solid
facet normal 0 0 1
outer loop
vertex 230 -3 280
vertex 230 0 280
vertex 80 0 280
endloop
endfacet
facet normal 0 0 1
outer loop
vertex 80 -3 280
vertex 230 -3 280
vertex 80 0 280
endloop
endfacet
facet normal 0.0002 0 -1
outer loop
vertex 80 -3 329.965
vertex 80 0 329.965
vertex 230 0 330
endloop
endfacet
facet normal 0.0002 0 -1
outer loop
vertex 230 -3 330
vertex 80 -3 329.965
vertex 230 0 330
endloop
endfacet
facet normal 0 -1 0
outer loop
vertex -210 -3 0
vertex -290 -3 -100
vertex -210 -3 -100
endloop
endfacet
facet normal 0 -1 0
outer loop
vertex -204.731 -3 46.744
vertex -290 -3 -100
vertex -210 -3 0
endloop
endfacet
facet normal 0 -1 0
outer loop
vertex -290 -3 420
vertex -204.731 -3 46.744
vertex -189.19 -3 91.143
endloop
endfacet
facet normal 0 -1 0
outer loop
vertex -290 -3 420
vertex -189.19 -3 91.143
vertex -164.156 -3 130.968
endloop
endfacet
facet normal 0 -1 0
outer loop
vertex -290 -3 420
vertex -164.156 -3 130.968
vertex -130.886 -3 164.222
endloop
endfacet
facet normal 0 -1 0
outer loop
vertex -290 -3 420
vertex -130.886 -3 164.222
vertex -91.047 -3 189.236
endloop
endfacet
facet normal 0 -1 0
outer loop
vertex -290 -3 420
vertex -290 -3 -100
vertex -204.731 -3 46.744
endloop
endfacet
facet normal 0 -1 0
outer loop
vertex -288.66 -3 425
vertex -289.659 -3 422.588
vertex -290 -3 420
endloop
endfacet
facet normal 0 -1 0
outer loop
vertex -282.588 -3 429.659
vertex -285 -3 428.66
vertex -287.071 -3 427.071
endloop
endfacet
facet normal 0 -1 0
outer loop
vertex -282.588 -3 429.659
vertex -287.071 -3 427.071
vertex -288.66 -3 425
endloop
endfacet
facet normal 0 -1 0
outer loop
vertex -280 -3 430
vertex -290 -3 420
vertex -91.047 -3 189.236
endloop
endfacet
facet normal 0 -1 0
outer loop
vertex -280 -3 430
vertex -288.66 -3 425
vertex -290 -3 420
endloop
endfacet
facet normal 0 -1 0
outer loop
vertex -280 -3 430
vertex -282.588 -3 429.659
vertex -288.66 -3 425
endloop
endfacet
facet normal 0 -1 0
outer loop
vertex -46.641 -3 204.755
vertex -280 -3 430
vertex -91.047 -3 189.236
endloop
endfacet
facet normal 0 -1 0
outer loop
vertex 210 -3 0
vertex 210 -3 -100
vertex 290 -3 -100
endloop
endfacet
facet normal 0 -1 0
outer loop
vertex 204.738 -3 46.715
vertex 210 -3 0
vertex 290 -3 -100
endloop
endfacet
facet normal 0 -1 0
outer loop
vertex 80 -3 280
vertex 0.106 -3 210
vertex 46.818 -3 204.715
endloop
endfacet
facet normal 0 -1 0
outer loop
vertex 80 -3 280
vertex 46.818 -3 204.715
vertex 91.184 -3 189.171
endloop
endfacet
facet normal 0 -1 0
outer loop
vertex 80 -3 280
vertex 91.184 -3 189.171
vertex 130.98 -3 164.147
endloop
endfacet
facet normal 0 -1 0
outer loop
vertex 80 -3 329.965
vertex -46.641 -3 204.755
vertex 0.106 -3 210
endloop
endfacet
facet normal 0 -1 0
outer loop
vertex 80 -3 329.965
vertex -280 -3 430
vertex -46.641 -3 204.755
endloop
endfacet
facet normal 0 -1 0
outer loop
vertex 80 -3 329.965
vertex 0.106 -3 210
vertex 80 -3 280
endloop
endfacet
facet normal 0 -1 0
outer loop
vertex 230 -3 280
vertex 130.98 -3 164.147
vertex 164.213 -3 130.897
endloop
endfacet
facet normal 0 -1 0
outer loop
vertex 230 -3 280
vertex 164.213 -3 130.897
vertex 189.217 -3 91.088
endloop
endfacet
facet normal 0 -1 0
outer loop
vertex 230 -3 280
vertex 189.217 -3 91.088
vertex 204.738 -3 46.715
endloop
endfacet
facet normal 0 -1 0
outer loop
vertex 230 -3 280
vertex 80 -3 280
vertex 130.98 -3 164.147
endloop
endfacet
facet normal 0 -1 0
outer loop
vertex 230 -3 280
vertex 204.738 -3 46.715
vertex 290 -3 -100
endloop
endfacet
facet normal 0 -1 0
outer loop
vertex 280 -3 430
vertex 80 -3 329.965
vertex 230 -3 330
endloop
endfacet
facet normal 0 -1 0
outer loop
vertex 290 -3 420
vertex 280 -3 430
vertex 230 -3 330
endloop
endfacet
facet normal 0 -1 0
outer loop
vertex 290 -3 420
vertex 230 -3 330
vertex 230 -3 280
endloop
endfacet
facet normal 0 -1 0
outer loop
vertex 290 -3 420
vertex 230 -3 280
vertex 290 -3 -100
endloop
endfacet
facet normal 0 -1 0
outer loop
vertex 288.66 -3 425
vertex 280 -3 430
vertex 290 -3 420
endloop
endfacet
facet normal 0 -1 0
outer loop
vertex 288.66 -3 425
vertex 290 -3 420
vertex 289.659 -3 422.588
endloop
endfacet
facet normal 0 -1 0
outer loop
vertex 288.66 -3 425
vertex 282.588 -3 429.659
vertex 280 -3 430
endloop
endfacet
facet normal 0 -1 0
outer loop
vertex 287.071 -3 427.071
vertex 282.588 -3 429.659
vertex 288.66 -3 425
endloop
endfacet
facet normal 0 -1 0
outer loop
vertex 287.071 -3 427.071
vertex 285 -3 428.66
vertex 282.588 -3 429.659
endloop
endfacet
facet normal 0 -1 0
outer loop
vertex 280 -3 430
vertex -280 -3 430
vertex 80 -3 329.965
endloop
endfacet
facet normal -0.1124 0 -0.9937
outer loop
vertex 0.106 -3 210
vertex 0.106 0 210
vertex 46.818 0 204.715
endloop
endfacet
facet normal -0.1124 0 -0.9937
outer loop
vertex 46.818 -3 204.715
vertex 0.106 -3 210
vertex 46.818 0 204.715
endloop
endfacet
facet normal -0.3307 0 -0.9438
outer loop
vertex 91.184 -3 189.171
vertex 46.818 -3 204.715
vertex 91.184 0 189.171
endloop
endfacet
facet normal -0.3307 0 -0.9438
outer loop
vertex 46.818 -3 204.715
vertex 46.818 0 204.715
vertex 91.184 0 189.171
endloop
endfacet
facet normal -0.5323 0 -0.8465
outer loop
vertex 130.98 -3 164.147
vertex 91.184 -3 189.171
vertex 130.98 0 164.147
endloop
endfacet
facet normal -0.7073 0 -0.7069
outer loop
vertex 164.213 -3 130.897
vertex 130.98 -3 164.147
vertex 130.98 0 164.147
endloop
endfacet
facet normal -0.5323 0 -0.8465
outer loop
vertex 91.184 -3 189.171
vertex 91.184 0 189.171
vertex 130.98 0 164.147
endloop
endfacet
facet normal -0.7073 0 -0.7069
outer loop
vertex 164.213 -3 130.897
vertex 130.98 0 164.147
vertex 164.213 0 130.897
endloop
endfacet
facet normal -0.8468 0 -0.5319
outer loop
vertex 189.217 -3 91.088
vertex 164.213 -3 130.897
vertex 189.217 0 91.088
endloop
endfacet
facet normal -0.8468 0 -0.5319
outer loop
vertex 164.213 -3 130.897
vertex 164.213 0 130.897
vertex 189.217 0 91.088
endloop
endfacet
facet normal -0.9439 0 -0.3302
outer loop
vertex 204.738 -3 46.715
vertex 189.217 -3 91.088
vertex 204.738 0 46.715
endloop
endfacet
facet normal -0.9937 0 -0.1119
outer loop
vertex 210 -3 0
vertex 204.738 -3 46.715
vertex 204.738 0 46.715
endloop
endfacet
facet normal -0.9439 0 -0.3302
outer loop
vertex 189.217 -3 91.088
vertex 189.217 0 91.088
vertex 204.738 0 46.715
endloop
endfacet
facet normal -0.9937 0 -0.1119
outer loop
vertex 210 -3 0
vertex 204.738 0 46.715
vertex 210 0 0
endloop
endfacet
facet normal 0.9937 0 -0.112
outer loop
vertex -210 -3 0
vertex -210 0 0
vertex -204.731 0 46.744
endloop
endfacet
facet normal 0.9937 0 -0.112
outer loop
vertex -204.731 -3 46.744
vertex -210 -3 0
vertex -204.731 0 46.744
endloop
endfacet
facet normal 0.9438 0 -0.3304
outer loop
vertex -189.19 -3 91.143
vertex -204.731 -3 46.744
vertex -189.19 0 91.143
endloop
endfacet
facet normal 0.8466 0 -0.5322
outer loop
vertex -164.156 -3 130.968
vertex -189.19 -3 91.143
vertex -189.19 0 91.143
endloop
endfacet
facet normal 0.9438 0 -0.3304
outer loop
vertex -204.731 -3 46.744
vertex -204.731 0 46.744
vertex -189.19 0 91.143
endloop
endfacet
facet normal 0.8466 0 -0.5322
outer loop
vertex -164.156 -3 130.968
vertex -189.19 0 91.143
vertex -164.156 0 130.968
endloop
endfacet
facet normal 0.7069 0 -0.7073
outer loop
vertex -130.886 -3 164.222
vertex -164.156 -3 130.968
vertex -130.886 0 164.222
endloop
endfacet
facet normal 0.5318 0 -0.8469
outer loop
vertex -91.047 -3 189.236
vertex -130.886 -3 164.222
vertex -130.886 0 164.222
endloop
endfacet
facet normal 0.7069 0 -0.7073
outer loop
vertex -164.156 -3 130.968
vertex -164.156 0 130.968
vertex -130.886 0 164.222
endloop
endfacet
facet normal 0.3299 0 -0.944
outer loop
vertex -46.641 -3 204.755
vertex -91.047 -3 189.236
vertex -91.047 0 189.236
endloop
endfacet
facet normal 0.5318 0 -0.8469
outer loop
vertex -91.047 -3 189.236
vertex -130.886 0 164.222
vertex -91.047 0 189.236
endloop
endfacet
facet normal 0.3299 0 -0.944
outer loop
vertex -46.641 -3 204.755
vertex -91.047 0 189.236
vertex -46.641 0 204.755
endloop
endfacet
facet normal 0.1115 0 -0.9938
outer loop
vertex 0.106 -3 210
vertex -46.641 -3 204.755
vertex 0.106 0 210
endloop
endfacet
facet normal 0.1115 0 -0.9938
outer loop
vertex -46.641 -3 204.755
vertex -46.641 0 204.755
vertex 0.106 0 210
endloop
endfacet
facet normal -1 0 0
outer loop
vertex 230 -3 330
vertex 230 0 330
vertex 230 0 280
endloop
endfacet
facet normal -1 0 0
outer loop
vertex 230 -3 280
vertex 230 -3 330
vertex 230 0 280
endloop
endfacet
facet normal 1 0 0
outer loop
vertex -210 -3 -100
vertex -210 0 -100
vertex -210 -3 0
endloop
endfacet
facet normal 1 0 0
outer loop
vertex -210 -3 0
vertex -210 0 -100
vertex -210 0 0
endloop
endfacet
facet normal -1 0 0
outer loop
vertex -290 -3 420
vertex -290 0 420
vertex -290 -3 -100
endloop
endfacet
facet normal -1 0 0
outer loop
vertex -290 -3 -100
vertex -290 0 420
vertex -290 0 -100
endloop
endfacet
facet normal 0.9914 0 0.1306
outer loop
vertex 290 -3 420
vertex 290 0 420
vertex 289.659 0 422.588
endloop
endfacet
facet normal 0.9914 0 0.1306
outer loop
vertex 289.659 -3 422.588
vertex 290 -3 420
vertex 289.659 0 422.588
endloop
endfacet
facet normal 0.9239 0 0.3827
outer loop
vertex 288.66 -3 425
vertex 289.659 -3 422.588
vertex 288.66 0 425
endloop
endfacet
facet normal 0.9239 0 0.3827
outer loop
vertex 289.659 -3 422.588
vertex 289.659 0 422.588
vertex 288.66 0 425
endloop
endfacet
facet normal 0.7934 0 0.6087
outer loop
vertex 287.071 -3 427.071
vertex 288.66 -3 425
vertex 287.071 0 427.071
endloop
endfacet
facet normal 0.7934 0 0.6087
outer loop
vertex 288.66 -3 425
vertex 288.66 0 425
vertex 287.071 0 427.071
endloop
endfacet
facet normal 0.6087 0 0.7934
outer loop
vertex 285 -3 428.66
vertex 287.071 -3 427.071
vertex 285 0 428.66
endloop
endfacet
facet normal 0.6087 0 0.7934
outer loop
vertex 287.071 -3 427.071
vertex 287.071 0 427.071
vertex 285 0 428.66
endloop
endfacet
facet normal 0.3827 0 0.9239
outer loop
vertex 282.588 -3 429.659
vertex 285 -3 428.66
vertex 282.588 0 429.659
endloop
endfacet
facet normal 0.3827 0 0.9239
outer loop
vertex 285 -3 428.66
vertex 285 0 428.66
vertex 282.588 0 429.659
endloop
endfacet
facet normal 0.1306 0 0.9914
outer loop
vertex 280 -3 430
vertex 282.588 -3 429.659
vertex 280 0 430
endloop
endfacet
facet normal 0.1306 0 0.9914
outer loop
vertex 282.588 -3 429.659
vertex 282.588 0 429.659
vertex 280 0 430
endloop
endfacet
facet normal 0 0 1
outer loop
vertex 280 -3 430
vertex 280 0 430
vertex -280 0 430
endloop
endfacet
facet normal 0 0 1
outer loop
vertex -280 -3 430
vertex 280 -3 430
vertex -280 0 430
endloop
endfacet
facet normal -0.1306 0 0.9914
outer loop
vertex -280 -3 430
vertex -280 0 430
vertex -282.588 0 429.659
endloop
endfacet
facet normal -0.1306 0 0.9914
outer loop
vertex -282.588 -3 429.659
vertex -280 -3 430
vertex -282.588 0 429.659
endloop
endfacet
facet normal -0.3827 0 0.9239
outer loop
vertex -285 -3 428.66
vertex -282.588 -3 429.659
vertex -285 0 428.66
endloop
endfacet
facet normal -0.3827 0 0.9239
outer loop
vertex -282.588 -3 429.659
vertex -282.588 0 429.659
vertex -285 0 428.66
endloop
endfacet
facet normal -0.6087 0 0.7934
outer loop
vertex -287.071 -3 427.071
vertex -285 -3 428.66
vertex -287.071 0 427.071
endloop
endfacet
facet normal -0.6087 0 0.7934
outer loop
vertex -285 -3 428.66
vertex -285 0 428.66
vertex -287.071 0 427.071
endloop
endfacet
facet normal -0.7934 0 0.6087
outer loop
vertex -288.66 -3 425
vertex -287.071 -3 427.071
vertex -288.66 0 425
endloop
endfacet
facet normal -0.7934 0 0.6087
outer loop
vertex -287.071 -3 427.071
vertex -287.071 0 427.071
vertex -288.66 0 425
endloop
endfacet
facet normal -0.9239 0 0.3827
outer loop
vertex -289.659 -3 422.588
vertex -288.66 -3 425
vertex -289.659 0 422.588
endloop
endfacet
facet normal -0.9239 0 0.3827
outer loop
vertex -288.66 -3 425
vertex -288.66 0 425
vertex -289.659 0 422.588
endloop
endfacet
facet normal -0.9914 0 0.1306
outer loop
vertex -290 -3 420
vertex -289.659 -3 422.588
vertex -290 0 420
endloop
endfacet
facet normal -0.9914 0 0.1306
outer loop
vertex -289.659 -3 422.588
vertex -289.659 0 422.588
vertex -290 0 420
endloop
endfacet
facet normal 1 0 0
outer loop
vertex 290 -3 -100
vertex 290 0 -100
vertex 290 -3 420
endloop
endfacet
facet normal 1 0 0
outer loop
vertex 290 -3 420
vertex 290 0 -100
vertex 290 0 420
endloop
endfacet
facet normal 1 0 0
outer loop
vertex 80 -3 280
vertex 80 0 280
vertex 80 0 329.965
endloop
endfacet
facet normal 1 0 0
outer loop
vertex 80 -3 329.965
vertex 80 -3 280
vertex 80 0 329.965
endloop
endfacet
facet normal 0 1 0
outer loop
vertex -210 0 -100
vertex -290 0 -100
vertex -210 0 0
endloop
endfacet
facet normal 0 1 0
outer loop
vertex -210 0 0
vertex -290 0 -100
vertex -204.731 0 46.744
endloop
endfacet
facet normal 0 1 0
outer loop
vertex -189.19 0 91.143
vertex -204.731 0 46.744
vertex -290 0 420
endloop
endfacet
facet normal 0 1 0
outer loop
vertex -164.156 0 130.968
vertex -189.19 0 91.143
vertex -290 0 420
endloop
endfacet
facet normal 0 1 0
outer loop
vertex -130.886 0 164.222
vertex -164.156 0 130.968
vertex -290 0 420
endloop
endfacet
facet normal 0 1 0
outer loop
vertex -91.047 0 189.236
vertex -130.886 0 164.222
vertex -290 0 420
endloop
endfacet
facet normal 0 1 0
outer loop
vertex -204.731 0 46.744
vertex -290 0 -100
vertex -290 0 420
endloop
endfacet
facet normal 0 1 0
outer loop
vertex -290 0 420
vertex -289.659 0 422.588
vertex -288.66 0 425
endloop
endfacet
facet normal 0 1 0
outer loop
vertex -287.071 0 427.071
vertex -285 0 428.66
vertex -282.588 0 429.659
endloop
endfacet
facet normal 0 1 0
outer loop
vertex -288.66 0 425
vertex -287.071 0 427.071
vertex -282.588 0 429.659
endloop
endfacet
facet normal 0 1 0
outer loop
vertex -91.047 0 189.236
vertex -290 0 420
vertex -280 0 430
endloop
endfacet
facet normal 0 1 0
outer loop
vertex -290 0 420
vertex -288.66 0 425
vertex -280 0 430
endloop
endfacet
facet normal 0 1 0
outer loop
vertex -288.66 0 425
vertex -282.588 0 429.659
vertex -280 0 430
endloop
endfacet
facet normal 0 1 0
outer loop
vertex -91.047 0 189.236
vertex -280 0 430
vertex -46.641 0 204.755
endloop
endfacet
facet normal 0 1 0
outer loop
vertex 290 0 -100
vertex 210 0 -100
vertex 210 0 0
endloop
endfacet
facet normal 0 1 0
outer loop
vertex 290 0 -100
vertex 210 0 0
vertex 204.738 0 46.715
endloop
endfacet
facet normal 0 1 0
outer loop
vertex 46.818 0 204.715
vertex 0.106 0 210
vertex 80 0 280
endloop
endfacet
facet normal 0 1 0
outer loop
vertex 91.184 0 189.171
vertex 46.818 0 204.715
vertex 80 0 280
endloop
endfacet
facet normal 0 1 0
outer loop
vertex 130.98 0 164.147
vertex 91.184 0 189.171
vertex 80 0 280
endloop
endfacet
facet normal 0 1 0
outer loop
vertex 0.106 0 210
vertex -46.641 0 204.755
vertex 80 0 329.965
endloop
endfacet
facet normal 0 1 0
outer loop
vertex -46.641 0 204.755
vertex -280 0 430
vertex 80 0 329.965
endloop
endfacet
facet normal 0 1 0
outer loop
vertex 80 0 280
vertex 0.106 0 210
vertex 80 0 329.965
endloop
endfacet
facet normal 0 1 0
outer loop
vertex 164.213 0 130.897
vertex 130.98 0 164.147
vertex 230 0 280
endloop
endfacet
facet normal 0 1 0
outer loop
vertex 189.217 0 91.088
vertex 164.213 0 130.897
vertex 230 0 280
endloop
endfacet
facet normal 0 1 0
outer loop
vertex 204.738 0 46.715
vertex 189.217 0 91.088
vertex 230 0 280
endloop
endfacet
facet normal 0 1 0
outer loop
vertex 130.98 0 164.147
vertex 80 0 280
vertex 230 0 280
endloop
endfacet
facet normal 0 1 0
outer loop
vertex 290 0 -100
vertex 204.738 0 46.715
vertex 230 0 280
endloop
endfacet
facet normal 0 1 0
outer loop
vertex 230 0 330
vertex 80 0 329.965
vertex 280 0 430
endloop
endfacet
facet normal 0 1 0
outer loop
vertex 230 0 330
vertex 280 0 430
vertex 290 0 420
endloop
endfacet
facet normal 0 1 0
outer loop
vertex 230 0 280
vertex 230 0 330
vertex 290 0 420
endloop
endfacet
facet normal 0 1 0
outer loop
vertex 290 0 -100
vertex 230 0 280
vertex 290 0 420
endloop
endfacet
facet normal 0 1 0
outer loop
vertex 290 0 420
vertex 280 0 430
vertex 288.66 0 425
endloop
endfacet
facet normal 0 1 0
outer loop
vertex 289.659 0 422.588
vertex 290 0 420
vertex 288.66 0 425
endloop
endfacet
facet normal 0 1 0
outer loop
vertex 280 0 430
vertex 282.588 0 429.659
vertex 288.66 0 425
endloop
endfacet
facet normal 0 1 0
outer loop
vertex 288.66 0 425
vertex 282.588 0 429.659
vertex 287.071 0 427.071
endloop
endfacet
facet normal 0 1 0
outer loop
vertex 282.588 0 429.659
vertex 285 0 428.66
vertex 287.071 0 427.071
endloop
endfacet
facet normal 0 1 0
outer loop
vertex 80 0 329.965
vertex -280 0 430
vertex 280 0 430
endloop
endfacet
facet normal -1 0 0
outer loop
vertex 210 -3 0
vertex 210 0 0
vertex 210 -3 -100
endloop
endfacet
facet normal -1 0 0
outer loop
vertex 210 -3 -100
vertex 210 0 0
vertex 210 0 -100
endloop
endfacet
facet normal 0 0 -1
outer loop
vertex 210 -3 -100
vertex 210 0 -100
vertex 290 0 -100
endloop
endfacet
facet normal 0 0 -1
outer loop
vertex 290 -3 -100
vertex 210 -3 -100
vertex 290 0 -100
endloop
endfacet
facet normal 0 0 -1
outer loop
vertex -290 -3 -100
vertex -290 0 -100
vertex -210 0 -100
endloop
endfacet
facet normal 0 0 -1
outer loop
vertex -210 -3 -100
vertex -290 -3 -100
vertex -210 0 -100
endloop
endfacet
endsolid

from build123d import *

# Parameters (mm, degrees)
F1_DEPTH = 3


with BuildPart() as f1:
    # F0 (on Front) → F1 (new body)
    with BuildSketch(Plane.XZ):
        with BuildLine():
            Line((280, 430), (-280, 430))
            ThreePointArc((-280, 430), (-287.071068, 427.071068), (-290, 420))
            Line((-290, 420), (-290, -100))
            Line((-290, -100), (-210, -100))
            Line((-210, -100), (-210, 0))
            ThreePointArc((-210, 0), (-148.454947, 148.529892), (0.105988, 209.999973))
            ThreePointArc((0.105988, 209.999973), (148.529892, 148.454947), (210, 0))
            Line((210, 0), (210, -100))
            Line((210, -100), (290, -100))
            Line((290, -100), (290, 420))
            ThreePointArc((290, 420), (287.071068, 427.071068), (280, 430))
        make_face()
        Polygon((230, 280), (80, 280), (80, 329.965293), (230, 330), align=None, mode=Mode.SUBTRACT)
    extrude(amount=F1_DEPTH)


solid = f1.part
